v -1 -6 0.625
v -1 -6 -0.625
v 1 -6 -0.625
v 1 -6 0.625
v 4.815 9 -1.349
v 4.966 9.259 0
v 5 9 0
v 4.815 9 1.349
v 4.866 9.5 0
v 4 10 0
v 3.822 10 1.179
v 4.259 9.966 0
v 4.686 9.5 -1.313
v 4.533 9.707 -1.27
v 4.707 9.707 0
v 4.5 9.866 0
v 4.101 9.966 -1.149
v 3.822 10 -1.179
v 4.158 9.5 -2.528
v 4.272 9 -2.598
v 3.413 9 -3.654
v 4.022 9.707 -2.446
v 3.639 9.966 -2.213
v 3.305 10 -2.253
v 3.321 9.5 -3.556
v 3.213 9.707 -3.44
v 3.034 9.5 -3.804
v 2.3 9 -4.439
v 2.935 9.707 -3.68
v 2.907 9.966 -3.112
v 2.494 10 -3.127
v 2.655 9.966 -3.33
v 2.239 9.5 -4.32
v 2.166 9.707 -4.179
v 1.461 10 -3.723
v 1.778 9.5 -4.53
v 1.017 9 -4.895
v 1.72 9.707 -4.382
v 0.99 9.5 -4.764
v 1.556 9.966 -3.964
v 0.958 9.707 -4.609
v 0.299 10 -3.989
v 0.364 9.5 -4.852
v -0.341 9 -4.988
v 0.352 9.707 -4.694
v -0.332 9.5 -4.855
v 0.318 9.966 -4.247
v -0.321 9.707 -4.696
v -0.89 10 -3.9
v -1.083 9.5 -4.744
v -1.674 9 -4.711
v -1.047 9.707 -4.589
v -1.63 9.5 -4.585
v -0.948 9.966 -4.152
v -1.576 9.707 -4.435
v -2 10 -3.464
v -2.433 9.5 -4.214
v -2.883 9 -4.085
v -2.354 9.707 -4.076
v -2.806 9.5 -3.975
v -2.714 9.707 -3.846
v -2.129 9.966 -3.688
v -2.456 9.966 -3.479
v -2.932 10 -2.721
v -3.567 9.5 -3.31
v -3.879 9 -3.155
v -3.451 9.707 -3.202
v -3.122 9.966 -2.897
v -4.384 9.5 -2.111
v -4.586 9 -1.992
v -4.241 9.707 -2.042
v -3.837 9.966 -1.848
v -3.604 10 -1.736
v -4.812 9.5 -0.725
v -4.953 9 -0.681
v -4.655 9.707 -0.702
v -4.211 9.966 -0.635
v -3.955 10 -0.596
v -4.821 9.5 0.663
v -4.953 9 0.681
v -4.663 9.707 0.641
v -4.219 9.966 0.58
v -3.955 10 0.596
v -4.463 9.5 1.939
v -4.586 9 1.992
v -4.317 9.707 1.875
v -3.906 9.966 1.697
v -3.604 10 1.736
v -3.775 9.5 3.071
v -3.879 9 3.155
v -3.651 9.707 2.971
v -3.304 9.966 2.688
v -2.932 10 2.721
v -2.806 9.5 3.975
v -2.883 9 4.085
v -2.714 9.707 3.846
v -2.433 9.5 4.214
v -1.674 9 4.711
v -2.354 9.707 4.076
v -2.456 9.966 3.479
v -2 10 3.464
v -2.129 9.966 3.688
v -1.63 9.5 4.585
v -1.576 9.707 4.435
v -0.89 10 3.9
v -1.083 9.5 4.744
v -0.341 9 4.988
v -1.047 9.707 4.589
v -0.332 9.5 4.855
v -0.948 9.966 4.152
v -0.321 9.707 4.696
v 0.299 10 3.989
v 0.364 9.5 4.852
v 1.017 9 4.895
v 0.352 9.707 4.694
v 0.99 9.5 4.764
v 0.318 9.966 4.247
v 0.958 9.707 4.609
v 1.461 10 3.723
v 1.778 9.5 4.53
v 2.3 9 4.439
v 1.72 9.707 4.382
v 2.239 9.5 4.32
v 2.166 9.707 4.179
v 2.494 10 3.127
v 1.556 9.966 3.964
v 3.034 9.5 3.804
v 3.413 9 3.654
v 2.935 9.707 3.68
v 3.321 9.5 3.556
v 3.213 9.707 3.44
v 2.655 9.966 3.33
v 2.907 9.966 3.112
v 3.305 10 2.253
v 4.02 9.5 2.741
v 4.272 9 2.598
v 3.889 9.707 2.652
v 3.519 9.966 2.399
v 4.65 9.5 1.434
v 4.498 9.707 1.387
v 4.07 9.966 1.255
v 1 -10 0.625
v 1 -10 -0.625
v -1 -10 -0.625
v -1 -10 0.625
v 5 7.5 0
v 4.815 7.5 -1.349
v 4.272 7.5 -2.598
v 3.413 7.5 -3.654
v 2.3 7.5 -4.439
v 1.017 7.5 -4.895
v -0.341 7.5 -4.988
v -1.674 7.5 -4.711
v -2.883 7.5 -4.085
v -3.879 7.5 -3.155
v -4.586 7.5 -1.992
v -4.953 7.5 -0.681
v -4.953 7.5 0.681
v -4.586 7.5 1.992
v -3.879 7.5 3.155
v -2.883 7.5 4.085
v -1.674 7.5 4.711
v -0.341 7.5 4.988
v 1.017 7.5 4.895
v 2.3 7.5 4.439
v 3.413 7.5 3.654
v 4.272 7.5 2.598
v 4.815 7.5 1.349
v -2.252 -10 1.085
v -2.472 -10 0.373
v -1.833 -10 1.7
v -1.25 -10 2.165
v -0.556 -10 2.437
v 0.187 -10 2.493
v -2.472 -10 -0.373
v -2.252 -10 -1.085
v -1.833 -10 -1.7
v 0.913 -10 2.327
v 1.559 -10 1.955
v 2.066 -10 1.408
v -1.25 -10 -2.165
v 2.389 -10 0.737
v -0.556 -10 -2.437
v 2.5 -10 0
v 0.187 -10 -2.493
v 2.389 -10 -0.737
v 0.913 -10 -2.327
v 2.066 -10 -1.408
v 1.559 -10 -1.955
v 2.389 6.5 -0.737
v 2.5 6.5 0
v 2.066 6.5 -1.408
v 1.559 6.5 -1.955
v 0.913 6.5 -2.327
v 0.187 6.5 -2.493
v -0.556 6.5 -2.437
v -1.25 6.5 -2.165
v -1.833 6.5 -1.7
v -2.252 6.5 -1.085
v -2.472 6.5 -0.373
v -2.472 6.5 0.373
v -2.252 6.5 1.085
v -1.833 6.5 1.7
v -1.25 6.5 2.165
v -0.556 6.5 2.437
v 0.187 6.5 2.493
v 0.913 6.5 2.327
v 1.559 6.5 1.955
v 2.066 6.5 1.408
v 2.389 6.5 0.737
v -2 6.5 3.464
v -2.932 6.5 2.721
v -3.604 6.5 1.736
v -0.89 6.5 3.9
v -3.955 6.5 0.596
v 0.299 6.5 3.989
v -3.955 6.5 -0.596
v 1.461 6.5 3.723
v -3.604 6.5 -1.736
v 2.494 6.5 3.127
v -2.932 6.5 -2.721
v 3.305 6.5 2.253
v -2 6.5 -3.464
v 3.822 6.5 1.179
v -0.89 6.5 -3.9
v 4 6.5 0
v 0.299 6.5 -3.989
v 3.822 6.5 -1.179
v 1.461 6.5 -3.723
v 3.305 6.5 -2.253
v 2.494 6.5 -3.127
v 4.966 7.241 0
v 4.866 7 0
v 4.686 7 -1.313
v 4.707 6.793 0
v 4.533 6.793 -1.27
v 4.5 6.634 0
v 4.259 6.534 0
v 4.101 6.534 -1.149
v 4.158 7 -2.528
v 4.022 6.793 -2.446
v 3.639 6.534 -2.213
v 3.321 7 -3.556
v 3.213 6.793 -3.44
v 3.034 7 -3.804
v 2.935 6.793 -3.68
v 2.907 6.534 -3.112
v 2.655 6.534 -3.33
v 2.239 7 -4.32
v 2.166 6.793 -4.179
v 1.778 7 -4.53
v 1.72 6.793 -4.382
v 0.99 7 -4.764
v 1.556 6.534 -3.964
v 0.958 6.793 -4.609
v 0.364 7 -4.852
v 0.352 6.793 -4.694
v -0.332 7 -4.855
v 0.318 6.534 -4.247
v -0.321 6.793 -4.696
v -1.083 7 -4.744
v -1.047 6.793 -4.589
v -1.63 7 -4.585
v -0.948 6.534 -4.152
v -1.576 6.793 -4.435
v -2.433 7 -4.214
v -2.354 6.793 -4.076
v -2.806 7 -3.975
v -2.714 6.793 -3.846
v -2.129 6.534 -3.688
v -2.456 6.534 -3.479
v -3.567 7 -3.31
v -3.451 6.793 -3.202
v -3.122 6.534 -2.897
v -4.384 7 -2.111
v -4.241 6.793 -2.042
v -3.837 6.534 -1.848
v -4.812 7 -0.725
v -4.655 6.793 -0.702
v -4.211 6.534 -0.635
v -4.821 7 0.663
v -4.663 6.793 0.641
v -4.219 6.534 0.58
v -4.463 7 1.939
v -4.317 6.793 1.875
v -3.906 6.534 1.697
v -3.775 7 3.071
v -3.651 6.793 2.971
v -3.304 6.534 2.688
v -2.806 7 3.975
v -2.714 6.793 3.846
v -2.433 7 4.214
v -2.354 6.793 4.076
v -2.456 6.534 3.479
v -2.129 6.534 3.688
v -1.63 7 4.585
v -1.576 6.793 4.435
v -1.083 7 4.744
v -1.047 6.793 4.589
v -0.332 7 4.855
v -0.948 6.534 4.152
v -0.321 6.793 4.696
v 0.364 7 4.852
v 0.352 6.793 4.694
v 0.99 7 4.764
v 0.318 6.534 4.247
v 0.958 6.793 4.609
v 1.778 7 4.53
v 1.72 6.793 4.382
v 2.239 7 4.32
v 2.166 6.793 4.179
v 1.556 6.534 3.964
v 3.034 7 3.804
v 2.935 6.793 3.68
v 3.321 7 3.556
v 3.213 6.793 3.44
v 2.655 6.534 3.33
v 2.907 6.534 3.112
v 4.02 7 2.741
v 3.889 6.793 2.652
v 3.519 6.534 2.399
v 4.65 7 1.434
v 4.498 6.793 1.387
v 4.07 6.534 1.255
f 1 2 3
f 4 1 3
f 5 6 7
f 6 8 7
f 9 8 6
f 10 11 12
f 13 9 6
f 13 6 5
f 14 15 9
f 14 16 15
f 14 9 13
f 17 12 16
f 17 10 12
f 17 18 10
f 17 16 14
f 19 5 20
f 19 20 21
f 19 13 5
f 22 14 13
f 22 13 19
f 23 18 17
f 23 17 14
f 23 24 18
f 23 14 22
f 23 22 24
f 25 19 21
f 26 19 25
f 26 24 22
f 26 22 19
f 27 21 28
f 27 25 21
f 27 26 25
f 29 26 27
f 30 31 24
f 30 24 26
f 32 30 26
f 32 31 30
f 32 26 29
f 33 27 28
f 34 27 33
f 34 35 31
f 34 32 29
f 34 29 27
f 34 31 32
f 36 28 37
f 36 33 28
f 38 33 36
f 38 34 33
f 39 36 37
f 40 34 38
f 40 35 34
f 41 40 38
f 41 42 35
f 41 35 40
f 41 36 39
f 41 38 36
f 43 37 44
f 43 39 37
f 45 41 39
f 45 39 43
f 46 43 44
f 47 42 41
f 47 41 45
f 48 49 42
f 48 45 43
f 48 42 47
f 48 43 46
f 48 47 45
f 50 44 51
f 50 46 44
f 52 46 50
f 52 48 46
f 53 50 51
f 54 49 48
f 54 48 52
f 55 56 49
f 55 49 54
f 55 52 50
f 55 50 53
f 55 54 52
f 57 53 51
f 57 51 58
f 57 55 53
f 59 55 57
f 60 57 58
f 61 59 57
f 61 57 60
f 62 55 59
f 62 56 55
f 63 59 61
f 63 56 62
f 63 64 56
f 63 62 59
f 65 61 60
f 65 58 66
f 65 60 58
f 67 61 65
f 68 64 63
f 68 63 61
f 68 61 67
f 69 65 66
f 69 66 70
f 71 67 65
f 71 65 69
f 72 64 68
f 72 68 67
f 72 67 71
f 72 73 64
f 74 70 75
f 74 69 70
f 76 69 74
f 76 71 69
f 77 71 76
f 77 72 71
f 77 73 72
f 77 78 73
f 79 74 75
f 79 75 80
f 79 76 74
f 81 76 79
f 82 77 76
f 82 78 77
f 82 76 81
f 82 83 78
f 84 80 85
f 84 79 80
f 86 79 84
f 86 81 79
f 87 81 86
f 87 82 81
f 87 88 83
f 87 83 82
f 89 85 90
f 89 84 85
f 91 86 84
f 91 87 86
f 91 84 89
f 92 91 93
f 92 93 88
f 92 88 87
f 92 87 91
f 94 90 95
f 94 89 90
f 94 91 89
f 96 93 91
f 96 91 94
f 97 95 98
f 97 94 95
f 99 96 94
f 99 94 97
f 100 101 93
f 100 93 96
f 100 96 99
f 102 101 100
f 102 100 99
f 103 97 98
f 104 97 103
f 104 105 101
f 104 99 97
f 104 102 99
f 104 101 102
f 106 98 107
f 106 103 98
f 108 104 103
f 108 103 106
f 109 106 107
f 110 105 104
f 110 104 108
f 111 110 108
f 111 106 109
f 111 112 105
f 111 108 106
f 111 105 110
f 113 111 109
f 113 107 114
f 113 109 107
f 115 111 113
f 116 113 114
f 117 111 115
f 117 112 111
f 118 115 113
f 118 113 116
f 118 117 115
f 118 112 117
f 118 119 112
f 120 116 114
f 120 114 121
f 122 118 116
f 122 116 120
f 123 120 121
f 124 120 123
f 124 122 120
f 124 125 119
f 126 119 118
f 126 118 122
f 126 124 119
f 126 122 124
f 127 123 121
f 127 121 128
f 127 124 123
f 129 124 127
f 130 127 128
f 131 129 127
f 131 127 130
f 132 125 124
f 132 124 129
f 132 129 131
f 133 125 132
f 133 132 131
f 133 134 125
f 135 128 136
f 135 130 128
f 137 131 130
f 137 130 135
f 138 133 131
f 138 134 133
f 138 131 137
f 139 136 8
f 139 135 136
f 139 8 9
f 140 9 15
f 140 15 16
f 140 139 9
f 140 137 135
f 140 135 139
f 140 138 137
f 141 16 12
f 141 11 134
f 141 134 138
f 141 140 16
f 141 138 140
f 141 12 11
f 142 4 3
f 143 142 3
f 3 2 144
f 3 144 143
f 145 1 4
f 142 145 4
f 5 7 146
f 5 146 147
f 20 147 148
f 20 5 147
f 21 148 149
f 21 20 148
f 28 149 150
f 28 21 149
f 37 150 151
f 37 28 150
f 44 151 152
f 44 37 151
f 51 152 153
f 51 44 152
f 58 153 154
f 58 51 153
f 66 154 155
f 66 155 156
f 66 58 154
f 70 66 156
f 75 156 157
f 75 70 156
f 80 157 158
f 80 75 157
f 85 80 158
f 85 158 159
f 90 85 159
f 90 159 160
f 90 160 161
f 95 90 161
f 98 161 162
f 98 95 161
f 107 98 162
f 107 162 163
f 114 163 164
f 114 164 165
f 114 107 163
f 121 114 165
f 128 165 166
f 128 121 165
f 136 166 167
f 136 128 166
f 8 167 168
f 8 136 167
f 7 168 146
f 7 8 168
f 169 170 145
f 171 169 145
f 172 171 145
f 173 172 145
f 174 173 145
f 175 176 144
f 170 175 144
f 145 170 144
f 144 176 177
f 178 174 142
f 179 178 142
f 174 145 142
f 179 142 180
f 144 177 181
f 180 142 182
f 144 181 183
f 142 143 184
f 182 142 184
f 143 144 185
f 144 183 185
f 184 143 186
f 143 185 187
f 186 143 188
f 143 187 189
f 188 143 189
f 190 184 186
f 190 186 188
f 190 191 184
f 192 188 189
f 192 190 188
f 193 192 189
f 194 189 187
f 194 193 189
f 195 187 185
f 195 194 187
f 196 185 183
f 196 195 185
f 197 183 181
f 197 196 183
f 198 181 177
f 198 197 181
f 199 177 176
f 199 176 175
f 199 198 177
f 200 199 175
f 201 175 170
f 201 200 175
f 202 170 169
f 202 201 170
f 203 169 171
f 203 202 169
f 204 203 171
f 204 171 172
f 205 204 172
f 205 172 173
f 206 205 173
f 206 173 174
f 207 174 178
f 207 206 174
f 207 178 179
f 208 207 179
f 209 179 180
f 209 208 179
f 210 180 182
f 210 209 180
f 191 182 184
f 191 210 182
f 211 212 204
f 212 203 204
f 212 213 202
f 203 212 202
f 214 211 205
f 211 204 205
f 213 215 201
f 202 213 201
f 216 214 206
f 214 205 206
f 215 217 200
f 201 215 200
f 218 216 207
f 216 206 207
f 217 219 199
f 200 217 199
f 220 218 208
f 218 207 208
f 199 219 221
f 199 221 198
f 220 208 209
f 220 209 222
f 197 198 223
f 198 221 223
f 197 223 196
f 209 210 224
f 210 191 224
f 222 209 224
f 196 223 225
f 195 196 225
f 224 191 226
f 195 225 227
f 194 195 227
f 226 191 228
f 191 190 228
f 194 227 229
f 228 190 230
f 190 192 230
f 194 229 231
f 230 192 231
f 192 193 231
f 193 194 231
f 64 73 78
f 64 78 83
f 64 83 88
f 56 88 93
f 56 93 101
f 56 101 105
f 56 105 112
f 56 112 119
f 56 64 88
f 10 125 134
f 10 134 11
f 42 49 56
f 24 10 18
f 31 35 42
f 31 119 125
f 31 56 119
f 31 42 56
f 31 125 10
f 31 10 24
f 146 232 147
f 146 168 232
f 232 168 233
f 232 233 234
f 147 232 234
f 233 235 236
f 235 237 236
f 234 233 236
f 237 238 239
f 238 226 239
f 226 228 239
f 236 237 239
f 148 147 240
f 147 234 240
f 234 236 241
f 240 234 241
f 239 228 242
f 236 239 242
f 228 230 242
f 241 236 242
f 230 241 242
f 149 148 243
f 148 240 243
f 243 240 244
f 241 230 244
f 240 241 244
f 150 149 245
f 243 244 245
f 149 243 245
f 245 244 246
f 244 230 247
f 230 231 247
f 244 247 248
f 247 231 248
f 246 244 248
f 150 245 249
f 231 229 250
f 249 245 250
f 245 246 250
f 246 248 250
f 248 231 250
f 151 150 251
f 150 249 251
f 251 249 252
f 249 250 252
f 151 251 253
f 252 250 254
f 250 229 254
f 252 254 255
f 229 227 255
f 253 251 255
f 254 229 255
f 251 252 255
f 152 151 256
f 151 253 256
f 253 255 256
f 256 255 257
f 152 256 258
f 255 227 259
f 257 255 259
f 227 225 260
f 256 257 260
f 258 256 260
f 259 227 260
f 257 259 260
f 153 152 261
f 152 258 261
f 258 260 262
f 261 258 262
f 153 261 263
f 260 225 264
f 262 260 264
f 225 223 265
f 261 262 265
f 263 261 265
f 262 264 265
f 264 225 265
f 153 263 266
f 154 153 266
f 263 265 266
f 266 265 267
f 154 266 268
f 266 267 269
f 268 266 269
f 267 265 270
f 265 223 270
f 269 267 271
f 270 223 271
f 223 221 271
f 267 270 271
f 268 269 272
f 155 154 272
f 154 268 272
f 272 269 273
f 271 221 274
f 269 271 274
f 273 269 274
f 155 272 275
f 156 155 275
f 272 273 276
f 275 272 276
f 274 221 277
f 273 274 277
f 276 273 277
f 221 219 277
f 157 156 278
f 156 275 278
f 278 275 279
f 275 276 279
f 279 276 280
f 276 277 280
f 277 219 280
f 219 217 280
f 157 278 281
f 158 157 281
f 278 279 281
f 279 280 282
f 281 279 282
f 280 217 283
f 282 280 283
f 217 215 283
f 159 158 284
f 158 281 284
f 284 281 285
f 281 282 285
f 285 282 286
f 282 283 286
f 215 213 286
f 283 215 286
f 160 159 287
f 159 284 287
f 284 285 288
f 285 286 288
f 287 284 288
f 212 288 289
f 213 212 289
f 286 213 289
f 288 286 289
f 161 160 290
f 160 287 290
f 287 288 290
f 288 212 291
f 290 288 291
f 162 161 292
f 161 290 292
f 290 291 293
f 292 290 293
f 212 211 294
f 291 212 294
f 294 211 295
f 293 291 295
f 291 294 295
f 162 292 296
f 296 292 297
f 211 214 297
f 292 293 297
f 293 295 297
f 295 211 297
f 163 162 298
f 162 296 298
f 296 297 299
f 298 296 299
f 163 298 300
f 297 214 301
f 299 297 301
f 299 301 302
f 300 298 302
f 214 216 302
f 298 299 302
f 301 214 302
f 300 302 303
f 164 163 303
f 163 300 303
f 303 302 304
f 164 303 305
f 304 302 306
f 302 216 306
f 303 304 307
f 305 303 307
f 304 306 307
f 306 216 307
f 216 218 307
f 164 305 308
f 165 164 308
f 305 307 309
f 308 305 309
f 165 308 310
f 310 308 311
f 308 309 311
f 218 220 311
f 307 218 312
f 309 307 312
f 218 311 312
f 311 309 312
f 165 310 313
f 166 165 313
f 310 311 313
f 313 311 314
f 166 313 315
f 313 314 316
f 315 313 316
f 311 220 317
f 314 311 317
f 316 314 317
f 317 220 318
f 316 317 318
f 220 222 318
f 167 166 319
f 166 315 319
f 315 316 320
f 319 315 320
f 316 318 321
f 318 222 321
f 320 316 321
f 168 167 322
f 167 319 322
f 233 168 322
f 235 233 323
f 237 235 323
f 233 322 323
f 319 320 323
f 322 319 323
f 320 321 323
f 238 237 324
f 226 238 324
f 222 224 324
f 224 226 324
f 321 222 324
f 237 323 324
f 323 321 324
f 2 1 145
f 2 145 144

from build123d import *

# Parameters (mm, degrees)
SKETCH2_R           = 2.5
SKETCH2_W           = 2
SKETCH2_H           = 1.25
BOSS_EXTRUDE1_DEPTH = 10
FILLET1_R           = 1
SKETCH3_W           = 2
SKETCH3_H           = 1.25
BOSS_EXTRUDE5_DEPTH = 16
SKETCH4_R           = 5
THUMB_STICK_DEPTH   = 3.5
FILLET2_R           = 1
FILLET3_R           = 1


with BuildPart() as part:
    # Sketch2 → Boss-Extrude1 (new body, symmetric)
    with BuildSketch(Plane(origin=(0, 0, 0), x_dir=(1, 0, 0), z_dir=(0, 1, 0))):
        Circle(SKETCH2_R)
        Rectangle(SKETCH2_W, SKETCH2_H, mode=Mode.SUBTRACT)
    extrude(amount=BOSS_EXTRUDE1_DEPTH, both=True)

    # Fillet1
    fillet1_edges = [part.edges().sort_by_distance(p)[0] for p in [
        (-2.5, 10, 0),
    ]]
    fillet(fillet1_edges, radius=FILLET1_R)

    # Sketch3 → Boss-Extrude5 (add)
    with BuildSketch(Plane(origin=(0, 10, 0), x_dir=(1, 0, 0), z_dir=(0, 1, 0))):
        Rectangle(SKETCH3_W, SKETCH3_H)
    extrude(amount=-BOSS_EXTRUDE5_DEPTH)

    # Sketch4 → Thumb Stick (add)
    with BuildSketch(Plane(origin=(0, 10, 0), x_dir=(1, 0, 0), z_dir=(0, 1, 0))):
        Circle(SKETCH4_R)
    extrude(amount=-THUMB_STICK_DEPTH)

    # Fillet2
    fillet2_edges = [part.edges().sort_by_distance(p)[0] for p in [
        (-5, 6.5, 0),
    ]]
    fillet(fillet2_edges, radius=FILLET2_R)

    # Fillet3
    fillet3_edges = [part.edges().sort_by_distance(p)[0] for p in [
        (-5, 10, 0),
    ]]
    fillet(fillet3_edges, radius=FILLET3_R)


solid = part.part
